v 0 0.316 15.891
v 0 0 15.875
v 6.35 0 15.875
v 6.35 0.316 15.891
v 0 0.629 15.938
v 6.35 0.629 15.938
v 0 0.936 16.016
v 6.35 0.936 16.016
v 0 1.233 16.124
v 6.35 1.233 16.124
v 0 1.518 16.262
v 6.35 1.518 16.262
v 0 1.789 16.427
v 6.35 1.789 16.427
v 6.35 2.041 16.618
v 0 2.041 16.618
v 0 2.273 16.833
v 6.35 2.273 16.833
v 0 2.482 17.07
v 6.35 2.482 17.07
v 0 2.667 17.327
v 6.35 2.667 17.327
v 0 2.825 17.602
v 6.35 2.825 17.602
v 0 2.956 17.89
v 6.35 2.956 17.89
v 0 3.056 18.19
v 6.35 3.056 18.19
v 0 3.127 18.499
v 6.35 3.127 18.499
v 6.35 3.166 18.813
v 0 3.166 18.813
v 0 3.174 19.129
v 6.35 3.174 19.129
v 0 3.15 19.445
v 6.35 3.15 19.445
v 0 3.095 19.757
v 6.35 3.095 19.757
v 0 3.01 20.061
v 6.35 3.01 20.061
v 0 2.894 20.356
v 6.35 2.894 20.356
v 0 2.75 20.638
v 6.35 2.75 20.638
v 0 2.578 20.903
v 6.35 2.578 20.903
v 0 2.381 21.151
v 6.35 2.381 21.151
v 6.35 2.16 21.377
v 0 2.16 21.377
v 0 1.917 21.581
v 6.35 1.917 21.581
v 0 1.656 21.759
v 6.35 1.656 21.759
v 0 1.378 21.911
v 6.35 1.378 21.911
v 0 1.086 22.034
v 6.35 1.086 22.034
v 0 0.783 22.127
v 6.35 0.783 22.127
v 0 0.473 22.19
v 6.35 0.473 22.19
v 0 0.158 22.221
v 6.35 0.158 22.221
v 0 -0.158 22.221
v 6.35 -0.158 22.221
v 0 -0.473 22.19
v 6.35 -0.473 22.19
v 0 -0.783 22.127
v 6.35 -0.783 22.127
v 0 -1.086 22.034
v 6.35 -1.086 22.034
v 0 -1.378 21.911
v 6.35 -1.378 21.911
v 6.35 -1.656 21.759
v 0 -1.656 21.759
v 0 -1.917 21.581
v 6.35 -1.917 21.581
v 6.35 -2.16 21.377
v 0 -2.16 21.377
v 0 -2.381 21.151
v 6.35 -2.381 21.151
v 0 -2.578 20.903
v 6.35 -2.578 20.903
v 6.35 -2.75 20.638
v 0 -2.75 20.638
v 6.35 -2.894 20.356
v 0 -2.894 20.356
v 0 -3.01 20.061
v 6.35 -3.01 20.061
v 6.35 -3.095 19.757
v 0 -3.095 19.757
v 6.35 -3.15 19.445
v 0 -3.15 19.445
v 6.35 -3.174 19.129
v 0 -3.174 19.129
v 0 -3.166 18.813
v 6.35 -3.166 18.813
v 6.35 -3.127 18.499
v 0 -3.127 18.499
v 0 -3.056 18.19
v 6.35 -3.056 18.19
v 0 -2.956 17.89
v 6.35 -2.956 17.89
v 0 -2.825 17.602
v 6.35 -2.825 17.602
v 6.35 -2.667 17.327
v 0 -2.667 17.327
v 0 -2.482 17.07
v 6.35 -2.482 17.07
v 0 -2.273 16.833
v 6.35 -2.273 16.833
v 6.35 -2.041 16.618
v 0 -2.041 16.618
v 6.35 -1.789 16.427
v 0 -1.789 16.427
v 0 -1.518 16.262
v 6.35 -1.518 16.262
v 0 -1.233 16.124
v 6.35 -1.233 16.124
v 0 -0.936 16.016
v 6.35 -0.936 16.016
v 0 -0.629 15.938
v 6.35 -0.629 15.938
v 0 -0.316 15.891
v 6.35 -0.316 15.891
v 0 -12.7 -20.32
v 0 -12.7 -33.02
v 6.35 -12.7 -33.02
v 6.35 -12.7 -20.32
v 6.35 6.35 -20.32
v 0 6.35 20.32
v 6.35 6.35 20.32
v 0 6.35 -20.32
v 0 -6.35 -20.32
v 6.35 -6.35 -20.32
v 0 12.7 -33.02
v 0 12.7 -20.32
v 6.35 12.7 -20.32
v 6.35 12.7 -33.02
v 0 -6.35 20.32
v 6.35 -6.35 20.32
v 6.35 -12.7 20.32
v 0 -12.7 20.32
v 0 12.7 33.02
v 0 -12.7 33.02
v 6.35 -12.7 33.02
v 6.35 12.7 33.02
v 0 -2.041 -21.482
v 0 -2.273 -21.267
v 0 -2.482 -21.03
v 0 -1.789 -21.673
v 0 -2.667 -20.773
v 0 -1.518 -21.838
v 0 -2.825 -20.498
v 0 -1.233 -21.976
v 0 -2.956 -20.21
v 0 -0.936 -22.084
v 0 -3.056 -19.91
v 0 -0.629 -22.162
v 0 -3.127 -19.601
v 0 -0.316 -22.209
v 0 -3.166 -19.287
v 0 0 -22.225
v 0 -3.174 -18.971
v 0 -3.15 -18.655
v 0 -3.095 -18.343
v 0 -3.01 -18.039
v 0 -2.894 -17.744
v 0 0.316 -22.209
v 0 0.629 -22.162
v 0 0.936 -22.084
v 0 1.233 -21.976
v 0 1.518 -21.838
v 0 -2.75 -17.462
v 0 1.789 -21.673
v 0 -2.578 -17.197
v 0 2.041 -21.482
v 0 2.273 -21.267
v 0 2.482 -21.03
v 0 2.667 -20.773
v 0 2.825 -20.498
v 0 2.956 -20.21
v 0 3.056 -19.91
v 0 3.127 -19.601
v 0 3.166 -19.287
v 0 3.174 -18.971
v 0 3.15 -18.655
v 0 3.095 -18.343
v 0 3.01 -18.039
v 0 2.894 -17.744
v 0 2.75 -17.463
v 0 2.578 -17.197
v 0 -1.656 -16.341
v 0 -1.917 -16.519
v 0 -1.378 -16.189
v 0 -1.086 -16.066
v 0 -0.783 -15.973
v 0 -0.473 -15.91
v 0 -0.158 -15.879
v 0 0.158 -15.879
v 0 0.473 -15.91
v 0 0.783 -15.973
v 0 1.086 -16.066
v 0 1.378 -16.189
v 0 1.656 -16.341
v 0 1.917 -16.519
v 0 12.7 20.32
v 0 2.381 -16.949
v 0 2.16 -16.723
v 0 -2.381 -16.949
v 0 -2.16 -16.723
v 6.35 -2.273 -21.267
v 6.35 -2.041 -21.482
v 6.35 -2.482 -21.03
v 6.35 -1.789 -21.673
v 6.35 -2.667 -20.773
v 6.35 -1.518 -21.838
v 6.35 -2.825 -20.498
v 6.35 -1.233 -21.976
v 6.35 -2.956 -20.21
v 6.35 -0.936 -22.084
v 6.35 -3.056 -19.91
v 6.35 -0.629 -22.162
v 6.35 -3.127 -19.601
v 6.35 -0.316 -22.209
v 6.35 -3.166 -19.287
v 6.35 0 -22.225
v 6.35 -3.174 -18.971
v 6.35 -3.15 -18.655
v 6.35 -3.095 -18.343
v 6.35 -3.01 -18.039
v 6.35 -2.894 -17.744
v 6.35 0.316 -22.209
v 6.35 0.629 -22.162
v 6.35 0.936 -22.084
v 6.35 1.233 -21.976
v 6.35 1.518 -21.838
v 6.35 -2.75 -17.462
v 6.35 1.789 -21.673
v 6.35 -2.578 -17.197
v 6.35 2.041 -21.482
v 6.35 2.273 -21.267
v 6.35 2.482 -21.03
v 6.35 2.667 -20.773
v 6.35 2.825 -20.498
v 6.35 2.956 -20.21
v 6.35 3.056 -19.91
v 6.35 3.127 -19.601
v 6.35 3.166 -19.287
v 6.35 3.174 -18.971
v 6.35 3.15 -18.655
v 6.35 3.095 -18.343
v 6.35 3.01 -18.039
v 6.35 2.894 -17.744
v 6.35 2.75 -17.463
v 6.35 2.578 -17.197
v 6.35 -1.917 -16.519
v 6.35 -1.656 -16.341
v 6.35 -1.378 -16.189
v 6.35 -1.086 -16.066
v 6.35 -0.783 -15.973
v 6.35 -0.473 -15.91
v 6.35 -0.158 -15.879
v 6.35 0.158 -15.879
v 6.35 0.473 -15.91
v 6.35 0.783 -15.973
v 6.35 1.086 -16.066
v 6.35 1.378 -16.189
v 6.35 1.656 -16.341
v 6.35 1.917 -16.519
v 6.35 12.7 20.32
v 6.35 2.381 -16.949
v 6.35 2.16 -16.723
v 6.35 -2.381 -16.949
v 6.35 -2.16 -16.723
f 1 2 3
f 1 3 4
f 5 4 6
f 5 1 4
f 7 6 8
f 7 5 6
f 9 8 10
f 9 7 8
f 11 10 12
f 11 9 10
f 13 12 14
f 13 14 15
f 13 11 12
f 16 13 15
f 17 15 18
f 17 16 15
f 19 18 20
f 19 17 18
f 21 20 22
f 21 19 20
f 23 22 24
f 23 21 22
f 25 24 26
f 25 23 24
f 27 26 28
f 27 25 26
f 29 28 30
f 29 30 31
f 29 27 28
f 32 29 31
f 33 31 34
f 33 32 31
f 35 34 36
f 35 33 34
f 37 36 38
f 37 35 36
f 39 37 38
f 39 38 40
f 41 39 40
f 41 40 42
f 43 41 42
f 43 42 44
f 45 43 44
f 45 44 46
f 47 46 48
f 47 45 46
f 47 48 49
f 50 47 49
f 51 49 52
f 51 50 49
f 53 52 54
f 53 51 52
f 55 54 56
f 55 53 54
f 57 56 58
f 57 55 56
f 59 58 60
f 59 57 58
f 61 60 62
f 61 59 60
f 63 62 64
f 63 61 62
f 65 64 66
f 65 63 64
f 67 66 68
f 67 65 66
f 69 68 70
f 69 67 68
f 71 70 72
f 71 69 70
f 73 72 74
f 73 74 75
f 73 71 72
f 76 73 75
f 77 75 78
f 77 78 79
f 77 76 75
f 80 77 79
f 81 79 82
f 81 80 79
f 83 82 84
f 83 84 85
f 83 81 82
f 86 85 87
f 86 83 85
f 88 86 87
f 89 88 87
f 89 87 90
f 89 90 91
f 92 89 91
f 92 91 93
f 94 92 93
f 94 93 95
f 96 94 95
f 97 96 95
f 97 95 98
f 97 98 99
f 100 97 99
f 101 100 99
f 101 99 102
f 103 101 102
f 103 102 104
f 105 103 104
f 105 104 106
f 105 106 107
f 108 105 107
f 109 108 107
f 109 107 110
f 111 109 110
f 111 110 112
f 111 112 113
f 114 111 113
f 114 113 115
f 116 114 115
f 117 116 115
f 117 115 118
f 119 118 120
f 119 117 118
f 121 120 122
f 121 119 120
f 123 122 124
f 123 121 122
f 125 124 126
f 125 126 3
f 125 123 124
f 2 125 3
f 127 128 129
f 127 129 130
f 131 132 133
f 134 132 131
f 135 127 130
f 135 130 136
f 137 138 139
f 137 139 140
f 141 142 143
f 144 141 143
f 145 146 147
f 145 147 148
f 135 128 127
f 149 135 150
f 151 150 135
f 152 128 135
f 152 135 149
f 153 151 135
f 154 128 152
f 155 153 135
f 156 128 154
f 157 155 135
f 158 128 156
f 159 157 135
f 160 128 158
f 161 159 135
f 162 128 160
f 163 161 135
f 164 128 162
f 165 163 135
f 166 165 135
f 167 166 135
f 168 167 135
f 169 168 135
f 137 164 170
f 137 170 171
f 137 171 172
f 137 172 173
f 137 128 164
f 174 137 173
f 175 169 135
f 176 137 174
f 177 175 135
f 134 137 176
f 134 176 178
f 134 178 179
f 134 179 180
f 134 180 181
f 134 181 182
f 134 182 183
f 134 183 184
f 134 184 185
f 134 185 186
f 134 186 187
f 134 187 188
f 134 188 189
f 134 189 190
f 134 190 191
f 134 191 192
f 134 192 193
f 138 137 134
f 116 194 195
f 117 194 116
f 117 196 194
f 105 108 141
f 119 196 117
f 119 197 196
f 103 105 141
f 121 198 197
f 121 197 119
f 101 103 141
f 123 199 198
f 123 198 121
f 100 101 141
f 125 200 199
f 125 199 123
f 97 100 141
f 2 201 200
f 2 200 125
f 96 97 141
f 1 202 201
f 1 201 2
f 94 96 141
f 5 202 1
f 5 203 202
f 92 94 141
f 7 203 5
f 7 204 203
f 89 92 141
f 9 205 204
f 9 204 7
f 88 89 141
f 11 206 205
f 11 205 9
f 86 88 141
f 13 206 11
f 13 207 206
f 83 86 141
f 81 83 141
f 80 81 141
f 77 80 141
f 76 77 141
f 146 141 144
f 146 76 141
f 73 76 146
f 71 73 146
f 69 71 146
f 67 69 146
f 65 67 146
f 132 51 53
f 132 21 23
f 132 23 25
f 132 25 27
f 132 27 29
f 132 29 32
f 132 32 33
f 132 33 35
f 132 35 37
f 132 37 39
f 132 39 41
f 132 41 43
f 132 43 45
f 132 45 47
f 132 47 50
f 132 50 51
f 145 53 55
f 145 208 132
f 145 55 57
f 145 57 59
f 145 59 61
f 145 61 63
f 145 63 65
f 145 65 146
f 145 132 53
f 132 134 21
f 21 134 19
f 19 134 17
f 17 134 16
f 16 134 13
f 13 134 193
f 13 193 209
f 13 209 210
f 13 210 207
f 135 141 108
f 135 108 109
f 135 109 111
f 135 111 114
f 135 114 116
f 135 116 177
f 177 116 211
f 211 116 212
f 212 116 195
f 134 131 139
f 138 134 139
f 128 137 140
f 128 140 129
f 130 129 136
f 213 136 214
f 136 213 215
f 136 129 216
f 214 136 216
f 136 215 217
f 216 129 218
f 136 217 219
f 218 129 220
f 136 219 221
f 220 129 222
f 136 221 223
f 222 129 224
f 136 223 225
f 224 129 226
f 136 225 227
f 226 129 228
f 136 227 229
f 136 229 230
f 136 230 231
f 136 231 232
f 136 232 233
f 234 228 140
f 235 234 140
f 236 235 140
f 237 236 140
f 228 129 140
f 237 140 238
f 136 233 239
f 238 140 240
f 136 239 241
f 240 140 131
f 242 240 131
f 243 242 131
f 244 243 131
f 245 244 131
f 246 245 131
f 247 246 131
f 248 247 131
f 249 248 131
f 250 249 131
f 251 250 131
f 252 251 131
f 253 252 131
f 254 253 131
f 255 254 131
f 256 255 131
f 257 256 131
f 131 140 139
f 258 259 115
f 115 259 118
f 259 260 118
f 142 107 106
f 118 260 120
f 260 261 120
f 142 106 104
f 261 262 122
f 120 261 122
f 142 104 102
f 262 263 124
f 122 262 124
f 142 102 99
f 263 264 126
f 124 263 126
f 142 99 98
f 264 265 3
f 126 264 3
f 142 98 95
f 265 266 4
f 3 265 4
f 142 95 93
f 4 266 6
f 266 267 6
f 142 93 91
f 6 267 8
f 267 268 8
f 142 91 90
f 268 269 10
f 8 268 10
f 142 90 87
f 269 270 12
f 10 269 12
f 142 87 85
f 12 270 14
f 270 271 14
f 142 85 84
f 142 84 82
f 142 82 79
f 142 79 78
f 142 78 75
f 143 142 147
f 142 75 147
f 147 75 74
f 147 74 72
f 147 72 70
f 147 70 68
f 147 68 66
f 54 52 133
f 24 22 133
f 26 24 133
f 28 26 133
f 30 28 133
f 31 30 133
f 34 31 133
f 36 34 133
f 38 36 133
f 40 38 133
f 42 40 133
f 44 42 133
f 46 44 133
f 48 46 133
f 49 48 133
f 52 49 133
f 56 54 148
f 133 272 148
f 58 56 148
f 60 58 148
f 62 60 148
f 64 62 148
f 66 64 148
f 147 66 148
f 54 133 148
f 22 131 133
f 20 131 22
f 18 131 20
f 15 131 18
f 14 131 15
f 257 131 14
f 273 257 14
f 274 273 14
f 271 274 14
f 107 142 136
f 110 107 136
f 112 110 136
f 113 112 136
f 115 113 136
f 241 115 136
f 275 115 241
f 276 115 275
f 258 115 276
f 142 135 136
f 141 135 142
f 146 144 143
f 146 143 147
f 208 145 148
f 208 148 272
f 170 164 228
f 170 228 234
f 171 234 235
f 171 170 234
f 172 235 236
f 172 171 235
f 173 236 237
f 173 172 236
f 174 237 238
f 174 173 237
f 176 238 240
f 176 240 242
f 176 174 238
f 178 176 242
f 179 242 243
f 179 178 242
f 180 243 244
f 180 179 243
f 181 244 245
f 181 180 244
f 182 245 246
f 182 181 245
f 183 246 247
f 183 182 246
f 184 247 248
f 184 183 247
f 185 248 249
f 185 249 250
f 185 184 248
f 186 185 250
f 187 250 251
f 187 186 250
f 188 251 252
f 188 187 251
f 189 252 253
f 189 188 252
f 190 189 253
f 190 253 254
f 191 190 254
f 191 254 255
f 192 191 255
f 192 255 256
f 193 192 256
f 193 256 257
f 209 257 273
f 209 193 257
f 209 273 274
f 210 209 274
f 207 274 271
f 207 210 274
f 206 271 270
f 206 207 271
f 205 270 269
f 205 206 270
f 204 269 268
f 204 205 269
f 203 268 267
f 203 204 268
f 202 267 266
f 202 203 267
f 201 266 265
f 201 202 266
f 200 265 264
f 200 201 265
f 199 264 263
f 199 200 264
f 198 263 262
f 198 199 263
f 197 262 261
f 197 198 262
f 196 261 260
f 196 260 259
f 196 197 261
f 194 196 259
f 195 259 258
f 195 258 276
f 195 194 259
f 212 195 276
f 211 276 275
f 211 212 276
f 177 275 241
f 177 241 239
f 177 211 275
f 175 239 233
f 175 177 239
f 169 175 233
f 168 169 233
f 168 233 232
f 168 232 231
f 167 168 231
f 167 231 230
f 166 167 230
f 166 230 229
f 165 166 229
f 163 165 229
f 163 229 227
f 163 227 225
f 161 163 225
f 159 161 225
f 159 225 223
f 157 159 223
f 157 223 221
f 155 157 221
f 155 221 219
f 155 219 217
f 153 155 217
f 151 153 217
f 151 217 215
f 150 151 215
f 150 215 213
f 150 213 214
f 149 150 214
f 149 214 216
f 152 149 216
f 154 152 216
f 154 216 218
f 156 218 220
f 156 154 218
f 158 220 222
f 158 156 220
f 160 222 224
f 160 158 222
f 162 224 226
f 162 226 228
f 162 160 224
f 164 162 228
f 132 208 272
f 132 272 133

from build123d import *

# Parameters (mm, degrees)
SKETCH1_R           = 3.175
BOSS_EXTRUDE1_DEPTH = 6.35


with BuildPart() as part:
    # Sketch1 → Boss-Extrude1 (new body)
    with BuildSketch(Plane(origin=(0, 0, 0), x_dir=(0, 0, -1), z_dir=(1, 0, 0))):
        Polygon((-20.32, 12.7), (-20.32, 6.35), (20.32, 6.35), (20.32, 12.7), (33.02, 12.7), (33.02, -12.7), (20.32, -12.7), (20.32, -6.35), (-20.32, -6.35), (-20.32, -12.7), (-33.02, -12.7), (-33.02, 12.7), align=None)
        with Locations((-19.05, 0)):
            Circle(SKETCH1_R, mode=Mode.SUBTRACT)
        with Locations((19.05, 0)):
            Circle(SKETCH1_R, mode=Mode.SUBTRACT)
    extrude(amount=BOSS_EXTRUDE1_DEPTH)


solid = part.part
